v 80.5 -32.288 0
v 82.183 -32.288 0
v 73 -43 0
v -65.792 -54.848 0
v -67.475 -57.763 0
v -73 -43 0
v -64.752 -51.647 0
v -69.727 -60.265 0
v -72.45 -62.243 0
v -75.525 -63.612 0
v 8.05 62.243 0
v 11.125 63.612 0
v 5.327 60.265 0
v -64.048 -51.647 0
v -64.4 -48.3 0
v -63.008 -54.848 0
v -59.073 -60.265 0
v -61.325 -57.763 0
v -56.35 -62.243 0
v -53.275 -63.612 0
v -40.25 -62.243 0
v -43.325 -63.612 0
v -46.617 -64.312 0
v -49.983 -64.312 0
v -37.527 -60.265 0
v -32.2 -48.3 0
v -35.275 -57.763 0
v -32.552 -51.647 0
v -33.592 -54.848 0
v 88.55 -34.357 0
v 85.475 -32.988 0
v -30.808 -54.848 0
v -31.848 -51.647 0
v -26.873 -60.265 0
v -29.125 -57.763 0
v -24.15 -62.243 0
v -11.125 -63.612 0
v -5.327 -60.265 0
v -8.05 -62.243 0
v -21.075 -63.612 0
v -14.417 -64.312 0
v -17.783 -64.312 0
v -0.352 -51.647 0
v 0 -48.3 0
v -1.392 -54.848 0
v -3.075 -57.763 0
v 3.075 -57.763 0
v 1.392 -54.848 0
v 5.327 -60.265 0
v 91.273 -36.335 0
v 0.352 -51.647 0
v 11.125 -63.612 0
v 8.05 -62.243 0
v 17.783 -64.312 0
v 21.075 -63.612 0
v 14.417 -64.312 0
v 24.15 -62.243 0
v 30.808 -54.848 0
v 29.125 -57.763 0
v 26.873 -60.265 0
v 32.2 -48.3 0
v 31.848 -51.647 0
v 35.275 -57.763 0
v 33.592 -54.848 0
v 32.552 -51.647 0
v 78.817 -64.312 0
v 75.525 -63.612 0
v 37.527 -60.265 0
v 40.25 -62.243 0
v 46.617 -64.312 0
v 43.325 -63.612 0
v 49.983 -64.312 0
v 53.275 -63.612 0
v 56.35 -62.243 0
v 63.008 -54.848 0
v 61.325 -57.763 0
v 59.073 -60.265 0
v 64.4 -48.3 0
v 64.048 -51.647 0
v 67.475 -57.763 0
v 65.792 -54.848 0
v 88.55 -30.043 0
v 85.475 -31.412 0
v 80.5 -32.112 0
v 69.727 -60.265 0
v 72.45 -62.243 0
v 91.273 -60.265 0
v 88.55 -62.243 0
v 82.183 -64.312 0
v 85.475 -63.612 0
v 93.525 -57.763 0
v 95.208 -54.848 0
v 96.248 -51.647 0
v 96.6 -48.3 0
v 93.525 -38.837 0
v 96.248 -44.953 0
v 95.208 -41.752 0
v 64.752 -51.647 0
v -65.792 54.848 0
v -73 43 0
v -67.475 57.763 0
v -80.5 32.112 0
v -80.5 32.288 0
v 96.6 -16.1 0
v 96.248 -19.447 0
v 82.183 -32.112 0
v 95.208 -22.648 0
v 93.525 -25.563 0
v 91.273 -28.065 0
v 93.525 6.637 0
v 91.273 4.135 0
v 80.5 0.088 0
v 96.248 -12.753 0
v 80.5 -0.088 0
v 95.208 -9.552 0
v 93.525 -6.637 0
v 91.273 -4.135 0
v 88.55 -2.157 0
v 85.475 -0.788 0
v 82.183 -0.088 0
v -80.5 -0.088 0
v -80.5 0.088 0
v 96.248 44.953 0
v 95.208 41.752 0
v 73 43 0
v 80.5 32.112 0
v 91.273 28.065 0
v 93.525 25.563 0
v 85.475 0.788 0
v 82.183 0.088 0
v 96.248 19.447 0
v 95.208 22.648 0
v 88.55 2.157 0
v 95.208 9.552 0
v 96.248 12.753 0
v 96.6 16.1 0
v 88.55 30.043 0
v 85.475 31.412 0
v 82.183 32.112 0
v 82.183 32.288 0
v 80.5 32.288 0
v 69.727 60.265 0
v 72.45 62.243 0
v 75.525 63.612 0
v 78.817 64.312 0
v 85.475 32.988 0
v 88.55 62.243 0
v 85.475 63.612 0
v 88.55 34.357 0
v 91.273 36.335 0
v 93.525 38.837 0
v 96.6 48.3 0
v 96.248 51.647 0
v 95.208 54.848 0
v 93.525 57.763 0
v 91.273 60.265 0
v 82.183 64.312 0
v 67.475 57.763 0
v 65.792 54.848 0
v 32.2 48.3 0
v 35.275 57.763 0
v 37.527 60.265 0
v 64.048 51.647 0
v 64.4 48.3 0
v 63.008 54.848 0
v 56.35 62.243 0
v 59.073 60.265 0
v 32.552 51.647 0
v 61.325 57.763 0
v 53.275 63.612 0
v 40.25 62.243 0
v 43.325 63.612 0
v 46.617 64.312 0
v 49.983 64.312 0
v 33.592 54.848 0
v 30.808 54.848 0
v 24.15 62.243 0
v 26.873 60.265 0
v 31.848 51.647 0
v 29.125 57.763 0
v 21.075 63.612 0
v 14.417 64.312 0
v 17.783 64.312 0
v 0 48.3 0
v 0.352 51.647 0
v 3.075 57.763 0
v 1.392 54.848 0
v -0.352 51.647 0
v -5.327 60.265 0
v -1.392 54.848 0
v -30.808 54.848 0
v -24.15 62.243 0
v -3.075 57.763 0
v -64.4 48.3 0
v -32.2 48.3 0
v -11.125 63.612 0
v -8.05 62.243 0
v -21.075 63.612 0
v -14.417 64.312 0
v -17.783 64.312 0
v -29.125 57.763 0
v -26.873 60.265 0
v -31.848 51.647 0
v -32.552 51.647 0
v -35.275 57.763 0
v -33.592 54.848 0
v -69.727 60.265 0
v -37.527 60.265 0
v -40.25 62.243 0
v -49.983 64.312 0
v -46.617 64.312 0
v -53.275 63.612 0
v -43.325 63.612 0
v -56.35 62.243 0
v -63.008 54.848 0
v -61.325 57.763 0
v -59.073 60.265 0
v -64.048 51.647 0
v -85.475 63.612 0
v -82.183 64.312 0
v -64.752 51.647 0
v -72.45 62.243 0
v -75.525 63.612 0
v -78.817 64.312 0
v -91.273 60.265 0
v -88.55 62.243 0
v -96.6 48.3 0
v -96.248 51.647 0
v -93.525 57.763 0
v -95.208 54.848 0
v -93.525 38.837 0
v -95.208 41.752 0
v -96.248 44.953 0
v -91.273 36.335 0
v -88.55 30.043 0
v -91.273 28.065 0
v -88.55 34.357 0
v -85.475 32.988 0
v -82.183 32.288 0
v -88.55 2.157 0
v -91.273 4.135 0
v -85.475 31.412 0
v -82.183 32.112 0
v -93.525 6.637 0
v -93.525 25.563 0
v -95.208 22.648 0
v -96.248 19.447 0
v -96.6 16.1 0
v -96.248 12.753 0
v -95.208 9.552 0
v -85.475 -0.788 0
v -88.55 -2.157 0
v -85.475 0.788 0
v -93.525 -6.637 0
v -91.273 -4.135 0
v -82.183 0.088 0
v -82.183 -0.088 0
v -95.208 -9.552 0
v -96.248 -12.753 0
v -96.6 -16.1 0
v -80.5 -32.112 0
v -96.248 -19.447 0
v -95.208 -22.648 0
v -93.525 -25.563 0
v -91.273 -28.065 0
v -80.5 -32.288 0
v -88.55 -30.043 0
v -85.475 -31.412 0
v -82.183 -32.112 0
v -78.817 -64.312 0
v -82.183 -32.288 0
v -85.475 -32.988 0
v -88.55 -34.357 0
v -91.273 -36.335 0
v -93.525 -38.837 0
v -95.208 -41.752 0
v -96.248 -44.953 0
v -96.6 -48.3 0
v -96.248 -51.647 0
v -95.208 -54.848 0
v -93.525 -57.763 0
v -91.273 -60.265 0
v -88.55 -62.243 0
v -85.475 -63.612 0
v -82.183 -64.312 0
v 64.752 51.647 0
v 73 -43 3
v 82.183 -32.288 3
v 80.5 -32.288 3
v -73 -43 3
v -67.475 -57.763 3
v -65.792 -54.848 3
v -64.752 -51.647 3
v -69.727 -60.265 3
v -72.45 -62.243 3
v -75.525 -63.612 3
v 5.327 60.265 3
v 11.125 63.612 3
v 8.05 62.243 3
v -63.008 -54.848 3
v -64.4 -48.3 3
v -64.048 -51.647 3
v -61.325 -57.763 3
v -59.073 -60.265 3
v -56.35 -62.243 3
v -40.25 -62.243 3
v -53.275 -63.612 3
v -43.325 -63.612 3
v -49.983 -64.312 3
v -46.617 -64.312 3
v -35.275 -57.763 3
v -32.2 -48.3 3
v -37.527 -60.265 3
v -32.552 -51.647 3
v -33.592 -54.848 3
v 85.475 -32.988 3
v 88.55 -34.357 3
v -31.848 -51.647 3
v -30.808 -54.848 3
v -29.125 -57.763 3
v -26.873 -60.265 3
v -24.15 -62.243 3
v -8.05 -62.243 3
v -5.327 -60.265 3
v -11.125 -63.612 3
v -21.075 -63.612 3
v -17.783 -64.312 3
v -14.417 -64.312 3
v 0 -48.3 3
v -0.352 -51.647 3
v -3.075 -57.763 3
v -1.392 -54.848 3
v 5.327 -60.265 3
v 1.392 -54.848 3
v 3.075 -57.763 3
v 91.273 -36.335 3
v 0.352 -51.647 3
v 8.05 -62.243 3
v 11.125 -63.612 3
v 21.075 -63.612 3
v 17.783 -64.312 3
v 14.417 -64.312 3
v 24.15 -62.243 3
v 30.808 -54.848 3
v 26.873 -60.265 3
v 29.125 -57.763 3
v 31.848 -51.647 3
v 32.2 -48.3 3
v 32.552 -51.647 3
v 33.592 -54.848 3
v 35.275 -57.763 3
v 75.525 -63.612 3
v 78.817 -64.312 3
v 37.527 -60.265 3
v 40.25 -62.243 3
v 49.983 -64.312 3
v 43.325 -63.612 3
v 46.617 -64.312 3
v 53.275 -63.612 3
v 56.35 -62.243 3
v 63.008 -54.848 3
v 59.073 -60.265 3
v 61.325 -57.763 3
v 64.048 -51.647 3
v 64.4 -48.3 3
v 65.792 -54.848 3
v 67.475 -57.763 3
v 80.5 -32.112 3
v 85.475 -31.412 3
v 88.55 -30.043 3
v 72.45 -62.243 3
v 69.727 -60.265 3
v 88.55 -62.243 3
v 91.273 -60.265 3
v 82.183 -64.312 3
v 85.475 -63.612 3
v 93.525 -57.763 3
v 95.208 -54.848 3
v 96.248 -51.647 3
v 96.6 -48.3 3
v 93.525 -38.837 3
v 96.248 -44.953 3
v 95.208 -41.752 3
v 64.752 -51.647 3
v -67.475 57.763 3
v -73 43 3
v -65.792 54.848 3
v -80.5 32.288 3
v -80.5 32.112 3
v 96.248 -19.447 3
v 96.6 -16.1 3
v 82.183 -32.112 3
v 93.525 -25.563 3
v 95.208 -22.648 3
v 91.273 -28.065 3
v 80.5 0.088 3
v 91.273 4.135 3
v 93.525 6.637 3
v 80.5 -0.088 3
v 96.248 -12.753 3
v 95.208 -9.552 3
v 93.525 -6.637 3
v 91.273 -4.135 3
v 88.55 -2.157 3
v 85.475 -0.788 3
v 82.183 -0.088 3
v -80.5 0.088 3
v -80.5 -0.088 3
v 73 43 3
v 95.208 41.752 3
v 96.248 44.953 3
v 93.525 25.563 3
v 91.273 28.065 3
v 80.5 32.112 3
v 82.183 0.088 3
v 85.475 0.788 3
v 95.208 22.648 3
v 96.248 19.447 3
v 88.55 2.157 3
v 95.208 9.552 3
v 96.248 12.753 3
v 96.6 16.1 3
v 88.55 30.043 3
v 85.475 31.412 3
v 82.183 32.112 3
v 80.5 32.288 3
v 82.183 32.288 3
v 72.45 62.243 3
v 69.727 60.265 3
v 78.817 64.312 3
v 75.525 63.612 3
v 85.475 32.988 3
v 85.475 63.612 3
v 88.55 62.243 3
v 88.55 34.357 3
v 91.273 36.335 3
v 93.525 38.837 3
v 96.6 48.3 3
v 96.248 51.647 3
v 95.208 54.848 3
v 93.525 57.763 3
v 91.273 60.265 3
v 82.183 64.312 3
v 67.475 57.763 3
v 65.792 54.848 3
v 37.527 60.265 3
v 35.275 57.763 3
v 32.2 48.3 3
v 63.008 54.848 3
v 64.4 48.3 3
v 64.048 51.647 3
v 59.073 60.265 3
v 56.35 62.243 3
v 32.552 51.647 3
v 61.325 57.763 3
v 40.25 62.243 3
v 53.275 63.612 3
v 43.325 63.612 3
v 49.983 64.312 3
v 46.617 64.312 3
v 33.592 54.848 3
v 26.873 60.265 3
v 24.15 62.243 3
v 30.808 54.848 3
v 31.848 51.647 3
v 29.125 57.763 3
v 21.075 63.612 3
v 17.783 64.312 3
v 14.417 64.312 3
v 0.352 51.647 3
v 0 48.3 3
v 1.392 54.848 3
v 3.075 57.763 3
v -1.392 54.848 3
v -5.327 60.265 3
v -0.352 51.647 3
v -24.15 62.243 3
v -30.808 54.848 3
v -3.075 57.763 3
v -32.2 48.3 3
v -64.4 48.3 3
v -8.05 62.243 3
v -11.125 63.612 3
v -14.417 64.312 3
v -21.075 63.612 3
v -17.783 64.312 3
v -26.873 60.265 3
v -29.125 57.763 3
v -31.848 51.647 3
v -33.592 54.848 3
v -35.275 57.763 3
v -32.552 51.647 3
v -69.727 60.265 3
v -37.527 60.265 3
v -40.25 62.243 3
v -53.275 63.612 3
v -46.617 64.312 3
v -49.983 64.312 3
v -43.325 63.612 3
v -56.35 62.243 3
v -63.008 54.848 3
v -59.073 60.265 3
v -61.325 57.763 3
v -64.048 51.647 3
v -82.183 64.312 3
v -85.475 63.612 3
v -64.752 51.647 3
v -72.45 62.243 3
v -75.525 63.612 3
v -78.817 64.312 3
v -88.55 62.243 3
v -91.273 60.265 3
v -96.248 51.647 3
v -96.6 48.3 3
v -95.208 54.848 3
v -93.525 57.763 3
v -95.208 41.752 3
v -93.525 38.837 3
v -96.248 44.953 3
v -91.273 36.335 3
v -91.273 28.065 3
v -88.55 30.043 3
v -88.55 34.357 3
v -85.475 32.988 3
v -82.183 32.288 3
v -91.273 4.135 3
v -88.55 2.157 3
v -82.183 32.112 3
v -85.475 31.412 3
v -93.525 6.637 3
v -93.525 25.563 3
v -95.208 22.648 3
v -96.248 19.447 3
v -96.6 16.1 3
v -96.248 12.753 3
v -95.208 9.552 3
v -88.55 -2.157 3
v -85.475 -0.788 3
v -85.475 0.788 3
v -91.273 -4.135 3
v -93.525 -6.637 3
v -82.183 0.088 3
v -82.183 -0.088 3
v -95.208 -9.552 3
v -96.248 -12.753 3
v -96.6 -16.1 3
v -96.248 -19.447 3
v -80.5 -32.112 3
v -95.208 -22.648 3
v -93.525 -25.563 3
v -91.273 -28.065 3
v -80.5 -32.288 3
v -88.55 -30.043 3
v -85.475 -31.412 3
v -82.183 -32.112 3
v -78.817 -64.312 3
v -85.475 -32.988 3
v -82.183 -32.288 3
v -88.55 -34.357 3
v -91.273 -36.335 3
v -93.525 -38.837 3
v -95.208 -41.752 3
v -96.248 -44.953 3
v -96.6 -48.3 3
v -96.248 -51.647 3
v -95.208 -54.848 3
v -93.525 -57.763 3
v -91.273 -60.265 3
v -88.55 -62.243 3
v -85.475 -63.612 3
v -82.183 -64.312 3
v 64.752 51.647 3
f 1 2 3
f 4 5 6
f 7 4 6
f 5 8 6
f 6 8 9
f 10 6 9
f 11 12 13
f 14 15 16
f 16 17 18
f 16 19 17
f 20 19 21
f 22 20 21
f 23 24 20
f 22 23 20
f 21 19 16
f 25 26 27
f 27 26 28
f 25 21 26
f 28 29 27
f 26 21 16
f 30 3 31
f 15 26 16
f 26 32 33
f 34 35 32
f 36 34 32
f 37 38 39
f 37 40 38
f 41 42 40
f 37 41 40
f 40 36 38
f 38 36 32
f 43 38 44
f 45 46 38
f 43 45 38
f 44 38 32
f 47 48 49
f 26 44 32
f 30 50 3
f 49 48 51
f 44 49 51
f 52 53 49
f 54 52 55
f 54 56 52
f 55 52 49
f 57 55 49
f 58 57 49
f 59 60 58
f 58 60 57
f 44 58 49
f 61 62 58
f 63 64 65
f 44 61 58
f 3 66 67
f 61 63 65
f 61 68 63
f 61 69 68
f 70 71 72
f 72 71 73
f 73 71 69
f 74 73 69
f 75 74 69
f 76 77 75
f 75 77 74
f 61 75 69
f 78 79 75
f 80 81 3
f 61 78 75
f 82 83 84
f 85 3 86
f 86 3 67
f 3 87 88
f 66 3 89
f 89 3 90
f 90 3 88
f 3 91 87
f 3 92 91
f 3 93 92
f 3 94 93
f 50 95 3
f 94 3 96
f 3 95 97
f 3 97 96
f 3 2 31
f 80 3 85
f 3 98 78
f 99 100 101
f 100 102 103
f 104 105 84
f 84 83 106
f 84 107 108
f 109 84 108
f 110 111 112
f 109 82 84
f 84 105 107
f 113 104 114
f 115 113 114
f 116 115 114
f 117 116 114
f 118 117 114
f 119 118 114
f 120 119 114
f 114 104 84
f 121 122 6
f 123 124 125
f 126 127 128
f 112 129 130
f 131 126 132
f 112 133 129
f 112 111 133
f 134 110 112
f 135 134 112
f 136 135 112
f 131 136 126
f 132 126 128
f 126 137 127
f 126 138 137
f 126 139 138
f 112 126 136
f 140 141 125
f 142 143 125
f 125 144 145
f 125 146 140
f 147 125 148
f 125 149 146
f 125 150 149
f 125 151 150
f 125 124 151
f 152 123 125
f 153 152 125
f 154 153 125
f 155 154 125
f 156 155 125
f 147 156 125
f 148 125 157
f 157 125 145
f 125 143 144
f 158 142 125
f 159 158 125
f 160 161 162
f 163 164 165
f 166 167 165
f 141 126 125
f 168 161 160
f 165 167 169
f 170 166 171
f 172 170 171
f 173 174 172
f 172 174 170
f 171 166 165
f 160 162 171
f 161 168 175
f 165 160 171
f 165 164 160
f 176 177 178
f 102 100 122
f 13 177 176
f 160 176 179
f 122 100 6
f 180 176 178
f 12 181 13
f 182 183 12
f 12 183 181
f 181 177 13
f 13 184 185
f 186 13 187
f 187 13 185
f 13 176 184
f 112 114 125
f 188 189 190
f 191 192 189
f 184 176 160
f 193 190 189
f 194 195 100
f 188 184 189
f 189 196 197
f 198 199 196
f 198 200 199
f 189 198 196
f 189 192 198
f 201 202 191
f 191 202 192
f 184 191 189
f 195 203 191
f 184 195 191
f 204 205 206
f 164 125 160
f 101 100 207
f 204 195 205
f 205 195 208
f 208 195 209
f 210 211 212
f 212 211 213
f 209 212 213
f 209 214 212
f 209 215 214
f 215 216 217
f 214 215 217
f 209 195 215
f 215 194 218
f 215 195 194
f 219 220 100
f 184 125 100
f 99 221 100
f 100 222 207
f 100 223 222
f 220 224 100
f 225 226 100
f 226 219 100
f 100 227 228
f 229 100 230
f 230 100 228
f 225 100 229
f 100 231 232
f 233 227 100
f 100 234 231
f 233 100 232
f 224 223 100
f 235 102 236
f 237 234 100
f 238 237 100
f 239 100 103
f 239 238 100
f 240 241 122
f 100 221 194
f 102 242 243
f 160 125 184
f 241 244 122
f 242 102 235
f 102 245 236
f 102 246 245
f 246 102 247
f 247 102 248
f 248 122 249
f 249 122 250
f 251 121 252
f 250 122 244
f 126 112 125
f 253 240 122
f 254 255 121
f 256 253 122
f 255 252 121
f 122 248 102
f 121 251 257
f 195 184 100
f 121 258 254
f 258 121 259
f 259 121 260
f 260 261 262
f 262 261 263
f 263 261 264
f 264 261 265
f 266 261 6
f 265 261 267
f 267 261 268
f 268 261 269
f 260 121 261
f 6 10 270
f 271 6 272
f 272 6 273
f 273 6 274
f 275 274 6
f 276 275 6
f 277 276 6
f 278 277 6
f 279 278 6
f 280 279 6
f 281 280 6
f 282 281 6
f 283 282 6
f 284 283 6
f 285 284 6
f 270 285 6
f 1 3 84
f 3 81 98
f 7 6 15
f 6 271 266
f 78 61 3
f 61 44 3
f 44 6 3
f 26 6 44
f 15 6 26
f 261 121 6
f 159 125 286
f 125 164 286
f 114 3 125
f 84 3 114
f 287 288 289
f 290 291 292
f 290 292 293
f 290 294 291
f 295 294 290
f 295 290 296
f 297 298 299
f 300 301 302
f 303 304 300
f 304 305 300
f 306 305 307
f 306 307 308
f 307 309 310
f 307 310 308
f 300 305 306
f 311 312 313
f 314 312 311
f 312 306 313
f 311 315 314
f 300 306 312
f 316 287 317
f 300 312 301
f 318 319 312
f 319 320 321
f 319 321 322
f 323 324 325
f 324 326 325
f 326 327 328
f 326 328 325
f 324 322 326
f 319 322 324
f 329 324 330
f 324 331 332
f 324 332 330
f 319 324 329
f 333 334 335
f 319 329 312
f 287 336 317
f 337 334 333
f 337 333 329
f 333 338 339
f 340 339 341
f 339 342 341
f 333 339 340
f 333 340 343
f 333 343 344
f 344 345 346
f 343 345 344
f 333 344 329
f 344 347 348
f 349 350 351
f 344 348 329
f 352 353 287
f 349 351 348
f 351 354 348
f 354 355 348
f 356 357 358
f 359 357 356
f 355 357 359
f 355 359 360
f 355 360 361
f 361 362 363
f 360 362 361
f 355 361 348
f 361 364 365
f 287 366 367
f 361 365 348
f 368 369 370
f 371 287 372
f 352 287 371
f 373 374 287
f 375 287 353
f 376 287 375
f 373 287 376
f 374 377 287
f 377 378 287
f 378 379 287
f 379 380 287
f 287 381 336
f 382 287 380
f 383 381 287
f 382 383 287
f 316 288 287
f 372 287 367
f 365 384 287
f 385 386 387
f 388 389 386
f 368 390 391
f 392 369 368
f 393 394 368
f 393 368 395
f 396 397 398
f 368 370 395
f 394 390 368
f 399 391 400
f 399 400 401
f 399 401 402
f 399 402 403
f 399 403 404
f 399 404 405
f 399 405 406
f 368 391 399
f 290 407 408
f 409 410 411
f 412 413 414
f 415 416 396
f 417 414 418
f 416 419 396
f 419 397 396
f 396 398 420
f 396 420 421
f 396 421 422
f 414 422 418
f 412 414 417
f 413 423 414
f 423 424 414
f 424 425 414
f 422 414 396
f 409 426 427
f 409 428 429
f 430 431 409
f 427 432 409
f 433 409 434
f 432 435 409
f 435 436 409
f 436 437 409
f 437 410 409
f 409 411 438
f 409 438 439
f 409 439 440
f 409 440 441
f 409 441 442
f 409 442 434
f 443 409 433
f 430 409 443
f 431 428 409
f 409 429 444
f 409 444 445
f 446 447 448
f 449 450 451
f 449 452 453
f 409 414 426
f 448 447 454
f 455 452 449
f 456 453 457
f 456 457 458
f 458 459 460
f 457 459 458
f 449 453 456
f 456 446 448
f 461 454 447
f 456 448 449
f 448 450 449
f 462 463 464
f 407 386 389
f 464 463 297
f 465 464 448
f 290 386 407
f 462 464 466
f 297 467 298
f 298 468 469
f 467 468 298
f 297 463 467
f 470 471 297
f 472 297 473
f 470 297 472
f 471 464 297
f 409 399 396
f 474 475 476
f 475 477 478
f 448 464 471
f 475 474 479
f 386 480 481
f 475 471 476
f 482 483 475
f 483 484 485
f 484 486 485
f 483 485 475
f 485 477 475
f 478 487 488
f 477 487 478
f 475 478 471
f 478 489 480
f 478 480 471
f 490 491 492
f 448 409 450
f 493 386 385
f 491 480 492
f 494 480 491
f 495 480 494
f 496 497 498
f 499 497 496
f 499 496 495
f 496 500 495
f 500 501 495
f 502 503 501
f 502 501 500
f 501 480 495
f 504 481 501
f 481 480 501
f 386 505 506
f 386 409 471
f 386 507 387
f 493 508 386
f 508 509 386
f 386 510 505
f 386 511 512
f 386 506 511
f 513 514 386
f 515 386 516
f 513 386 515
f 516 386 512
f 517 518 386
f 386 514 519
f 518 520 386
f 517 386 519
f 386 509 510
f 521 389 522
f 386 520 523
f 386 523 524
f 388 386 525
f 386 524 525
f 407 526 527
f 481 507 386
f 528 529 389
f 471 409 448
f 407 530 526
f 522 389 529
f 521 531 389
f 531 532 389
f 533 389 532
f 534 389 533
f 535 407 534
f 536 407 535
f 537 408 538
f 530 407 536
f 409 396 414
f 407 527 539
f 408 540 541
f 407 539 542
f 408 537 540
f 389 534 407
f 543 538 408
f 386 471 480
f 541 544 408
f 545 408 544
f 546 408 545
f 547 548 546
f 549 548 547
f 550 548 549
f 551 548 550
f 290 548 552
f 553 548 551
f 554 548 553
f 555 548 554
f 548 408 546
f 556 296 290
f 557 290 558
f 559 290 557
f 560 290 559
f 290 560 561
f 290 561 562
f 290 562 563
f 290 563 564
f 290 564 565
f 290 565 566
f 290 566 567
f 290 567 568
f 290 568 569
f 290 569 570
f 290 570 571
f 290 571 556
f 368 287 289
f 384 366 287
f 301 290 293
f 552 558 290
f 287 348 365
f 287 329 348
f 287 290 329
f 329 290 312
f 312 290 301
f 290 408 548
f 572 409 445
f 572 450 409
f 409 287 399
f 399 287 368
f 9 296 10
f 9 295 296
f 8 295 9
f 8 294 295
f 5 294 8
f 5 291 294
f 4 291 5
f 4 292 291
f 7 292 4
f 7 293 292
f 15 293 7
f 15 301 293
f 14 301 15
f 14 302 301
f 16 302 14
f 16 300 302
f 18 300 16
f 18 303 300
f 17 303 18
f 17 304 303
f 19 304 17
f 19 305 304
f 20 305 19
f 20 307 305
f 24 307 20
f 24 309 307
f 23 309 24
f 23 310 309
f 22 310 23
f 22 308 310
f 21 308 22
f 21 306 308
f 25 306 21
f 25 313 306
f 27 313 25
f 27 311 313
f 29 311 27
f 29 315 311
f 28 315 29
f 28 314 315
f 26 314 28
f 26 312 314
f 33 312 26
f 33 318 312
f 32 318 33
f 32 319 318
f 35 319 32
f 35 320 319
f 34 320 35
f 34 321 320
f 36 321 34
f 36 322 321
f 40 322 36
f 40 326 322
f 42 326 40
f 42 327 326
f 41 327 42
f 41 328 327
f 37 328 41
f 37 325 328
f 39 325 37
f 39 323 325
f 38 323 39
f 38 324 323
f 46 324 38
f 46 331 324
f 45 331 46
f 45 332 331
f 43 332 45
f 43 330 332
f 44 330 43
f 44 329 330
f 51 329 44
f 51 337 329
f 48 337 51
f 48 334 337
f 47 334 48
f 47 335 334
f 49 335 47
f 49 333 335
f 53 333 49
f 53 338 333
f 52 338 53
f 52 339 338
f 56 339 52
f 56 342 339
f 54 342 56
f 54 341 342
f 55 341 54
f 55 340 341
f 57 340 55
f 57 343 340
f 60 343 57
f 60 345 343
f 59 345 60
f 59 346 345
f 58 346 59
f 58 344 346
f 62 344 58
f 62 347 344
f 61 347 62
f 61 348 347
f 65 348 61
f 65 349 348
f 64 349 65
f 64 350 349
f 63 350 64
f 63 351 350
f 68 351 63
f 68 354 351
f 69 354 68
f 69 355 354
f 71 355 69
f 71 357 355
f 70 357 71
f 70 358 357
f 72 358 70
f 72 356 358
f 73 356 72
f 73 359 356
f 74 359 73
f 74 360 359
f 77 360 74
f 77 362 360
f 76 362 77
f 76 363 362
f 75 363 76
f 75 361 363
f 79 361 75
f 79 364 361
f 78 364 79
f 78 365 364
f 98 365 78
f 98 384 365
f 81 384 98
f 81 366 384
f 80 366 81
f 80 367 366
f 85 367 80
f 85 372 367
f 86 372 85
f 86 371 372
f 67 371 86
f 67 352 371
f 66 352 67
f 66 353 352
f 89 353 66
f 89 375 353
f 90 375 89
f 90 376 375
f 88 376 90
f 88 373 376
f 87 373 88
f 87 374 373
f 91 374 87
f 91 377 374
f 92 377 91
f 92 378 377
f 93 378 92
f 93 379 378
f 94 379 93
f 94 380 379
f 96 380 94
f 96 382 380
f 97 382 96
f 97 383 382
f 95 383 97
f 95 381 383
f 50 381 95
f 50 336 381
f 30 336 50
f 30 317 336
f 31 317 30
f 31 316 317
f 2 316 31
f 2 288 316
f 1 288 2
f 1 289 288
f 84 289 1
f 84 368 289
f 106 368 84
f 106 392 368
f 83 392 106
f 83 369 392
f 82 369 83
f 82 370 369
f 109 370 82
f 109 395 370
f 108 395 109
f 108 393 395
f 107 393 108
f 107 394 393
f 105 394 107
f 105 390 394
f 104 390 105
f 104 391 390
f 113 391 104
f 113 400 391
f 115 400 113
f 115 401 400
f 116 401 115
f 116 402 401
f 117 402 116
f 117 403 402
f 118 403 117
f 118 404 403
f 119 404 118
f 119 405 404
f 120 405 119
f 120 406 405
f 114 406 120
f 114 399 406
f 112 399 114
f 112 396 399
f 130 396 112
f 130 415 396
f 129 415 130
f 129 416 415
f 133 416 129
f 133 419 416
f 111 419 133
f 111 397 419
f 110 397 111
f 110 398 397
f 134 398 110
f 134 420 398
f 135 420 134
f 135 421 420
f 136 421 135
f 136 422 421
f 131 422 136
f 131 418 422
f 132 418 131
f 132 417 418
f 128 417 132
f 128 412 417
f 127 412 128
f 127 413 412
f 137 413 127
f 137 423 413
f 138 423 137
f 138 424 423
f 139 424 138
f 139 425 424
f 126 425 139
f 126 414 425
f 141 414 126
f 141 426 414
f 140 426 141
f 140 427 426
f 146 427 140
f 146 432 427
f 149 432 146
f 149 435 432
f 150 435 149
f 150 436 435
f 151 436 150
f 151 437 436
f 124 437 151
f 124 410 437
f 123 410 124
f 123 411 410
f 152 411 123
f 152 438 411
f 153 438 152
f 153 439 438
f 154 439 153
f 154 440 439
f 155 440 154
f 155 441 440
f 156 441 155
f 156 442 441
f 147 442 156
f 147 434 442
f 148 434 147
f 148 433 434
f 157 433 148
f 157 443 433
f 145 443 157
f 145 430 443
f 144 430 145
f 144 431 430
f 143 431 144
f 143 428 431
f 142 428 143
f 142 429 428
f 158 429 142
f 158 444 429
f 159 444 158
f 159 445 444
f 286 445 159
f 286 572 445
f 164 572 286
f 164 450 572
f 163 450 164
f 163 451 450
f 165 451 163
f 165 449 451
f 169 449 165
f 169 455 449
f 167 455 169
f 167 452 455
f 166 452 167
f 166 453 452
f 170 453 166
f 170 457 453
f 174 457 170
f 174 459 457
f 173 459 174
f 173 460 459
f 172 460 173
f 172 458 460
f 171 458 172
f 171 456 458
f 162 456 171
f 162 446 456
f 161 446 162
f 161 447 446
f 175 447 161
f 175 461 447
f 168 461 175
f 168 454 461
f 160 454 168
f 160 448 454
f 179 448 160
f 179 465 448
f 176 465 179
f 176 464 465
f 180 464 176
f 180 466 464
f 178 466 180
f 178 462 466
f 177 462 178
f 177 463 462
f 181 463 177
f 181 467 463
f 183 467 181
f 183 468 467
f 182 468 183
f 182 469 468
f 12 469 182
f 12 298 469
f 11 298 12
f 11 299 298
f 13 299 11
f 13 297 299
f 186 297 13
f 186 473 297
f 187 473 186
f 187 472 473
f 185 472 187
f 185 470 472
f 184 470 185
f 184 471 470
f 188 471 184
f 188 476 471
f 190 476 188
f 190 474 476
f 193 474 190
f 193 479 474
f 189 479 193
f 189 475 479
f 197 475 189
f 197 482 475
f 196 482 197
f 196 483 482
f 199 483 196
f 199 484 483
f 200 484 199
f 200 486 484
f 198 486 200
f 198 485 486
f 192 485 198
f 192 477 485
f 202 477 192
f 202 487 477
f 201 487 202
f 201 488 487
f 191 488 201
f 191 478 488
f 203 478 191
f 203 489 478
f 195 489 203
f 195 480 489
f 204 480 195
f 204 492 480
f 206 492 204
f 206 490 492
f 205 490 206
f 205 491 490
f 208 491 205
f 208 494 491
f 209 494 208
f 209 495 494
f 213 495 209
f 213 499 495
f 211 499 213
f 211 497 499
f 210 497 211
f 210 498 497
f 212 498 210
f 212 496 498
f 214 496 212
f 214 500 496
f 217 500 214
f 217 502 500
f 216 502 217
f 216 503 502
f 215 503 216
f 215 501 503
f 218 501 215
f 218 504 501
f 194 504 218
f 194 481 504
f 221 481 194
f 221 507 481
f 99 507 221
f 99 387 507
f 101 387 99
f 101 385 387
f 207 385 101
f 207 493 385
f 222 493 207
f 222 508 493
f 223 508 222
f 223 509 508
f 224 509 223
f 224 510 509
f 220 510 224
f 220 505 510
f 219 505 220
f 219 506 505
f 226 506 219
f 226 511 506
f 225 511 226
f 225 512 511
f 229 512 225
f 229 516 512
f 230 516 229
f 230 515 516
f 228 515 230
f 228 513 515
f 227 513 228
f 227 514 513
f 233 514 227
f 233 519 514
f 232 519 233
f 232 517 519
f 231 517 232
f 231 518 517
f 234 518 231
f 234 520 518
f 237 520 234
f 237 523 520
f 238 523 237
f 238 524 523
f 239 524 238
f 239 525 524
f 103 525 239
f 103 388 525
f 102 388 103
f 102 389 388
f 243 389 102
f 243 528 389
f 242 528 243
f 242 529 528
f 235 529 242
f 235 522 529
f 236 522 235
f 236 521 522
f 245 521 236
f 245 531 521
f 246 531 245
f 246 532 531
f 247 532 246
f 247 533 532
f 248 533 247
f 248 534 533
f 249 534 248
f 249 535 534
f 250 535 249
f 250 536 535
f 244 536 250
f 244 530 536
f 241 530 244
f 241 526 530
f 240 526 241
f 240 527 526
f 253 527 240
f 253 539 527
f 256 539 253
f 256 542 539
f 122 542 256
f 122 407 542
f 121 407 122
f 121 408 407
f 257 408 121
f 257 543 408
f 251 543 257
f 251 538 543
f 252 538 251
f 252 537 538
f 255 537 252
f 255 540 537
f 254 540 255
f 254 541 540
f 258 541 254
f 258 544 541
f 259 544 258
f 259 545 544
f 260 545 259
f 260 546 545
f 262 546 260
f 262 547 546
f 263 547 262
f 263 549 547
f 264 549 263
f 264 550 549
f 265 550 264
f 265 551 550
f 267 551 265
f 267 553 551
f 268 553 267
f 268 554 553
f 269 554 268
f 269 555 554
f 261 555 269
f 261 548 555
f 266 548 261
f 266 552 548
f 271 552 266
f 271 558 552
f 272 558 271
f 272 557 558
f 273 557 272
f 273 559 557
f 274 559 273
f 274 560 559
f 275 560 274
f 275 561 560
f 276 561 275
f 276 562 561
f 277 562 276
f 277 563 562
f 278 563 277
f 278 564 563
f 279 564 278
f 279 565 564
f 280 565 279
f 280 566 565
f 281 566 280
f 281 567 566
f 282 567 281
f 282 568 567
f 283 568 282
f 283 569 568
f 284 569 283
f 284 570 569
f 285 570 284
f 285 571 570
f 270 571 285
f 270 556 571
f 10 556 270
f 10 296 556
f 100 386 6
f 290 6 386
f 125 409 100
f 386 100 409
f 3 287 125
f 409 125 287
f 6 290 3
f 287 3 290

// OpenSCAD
// Parameters
socket_width = 146;   // UK double gang socket width in mm
socket_height = 86;   // UK double gang socket height in mm
border_width = 10;    // Border width around the socket
num_circles_x = 6;    // Number of circles along width
thickness = 3;

// Derived dimensions
total_width = socket_width + 1.5 * border_width;
min_height = socket_height + 1.5 * border_width;
circle_diameter_x = total_width / (num_circles_x - 1);

num_circles_y = ceil(min_height / circle_diameter_x);
total_height = circle_diameter_x * (num_circles_y - 1);
circle_diameter_y = circle_diameter_x;

// Function to place circles along an edge
module place_circles(start, end, count) {
    for (i = [0 : count - 1]) {
        pos = start + (end - start) * i / (count - 1);
        translate([pos.x, pos.y]) circle(d=circle_diameter_x);
    }
}

// Generate filled scalloped rectangle with cutout
linear_extrude(height=thickness) {
difference() {
    union() {
        // Filled rectangle
        square([total_width, total_height], center=true);
        
        // Add external scallops
        scalloped_rectangle();
    }
    
    // Cutout for the socket
    square([socket_width, socket_height], center=true);
}
}
// Generate circles around the rectangle
module scalloped_rectangle() {
    // Top edge
    place_circles([ -total_width / 2, total_height / 2 ], 
                  [ total_width / 2, total_height / 2 ], num_circles_x);
    
    // Bottom edge
    place_circles([ -total_width / 2, -total_height / 2 ], 
                  [ total_width / 2, -total_height / 2 ], num_circles_x);
    
    // Left edge
    place_circles([ -total_width / 2, -total_height / 2 ], 
                  [ -total_width / 2, total_height / 2 ], num_circles_y);
    
    // Right edge
    place_circles([ total_width / 2, -total_height / 2 ], 
                  [ total_width / 2, total_height / 2 ], num_circles_y);
}
